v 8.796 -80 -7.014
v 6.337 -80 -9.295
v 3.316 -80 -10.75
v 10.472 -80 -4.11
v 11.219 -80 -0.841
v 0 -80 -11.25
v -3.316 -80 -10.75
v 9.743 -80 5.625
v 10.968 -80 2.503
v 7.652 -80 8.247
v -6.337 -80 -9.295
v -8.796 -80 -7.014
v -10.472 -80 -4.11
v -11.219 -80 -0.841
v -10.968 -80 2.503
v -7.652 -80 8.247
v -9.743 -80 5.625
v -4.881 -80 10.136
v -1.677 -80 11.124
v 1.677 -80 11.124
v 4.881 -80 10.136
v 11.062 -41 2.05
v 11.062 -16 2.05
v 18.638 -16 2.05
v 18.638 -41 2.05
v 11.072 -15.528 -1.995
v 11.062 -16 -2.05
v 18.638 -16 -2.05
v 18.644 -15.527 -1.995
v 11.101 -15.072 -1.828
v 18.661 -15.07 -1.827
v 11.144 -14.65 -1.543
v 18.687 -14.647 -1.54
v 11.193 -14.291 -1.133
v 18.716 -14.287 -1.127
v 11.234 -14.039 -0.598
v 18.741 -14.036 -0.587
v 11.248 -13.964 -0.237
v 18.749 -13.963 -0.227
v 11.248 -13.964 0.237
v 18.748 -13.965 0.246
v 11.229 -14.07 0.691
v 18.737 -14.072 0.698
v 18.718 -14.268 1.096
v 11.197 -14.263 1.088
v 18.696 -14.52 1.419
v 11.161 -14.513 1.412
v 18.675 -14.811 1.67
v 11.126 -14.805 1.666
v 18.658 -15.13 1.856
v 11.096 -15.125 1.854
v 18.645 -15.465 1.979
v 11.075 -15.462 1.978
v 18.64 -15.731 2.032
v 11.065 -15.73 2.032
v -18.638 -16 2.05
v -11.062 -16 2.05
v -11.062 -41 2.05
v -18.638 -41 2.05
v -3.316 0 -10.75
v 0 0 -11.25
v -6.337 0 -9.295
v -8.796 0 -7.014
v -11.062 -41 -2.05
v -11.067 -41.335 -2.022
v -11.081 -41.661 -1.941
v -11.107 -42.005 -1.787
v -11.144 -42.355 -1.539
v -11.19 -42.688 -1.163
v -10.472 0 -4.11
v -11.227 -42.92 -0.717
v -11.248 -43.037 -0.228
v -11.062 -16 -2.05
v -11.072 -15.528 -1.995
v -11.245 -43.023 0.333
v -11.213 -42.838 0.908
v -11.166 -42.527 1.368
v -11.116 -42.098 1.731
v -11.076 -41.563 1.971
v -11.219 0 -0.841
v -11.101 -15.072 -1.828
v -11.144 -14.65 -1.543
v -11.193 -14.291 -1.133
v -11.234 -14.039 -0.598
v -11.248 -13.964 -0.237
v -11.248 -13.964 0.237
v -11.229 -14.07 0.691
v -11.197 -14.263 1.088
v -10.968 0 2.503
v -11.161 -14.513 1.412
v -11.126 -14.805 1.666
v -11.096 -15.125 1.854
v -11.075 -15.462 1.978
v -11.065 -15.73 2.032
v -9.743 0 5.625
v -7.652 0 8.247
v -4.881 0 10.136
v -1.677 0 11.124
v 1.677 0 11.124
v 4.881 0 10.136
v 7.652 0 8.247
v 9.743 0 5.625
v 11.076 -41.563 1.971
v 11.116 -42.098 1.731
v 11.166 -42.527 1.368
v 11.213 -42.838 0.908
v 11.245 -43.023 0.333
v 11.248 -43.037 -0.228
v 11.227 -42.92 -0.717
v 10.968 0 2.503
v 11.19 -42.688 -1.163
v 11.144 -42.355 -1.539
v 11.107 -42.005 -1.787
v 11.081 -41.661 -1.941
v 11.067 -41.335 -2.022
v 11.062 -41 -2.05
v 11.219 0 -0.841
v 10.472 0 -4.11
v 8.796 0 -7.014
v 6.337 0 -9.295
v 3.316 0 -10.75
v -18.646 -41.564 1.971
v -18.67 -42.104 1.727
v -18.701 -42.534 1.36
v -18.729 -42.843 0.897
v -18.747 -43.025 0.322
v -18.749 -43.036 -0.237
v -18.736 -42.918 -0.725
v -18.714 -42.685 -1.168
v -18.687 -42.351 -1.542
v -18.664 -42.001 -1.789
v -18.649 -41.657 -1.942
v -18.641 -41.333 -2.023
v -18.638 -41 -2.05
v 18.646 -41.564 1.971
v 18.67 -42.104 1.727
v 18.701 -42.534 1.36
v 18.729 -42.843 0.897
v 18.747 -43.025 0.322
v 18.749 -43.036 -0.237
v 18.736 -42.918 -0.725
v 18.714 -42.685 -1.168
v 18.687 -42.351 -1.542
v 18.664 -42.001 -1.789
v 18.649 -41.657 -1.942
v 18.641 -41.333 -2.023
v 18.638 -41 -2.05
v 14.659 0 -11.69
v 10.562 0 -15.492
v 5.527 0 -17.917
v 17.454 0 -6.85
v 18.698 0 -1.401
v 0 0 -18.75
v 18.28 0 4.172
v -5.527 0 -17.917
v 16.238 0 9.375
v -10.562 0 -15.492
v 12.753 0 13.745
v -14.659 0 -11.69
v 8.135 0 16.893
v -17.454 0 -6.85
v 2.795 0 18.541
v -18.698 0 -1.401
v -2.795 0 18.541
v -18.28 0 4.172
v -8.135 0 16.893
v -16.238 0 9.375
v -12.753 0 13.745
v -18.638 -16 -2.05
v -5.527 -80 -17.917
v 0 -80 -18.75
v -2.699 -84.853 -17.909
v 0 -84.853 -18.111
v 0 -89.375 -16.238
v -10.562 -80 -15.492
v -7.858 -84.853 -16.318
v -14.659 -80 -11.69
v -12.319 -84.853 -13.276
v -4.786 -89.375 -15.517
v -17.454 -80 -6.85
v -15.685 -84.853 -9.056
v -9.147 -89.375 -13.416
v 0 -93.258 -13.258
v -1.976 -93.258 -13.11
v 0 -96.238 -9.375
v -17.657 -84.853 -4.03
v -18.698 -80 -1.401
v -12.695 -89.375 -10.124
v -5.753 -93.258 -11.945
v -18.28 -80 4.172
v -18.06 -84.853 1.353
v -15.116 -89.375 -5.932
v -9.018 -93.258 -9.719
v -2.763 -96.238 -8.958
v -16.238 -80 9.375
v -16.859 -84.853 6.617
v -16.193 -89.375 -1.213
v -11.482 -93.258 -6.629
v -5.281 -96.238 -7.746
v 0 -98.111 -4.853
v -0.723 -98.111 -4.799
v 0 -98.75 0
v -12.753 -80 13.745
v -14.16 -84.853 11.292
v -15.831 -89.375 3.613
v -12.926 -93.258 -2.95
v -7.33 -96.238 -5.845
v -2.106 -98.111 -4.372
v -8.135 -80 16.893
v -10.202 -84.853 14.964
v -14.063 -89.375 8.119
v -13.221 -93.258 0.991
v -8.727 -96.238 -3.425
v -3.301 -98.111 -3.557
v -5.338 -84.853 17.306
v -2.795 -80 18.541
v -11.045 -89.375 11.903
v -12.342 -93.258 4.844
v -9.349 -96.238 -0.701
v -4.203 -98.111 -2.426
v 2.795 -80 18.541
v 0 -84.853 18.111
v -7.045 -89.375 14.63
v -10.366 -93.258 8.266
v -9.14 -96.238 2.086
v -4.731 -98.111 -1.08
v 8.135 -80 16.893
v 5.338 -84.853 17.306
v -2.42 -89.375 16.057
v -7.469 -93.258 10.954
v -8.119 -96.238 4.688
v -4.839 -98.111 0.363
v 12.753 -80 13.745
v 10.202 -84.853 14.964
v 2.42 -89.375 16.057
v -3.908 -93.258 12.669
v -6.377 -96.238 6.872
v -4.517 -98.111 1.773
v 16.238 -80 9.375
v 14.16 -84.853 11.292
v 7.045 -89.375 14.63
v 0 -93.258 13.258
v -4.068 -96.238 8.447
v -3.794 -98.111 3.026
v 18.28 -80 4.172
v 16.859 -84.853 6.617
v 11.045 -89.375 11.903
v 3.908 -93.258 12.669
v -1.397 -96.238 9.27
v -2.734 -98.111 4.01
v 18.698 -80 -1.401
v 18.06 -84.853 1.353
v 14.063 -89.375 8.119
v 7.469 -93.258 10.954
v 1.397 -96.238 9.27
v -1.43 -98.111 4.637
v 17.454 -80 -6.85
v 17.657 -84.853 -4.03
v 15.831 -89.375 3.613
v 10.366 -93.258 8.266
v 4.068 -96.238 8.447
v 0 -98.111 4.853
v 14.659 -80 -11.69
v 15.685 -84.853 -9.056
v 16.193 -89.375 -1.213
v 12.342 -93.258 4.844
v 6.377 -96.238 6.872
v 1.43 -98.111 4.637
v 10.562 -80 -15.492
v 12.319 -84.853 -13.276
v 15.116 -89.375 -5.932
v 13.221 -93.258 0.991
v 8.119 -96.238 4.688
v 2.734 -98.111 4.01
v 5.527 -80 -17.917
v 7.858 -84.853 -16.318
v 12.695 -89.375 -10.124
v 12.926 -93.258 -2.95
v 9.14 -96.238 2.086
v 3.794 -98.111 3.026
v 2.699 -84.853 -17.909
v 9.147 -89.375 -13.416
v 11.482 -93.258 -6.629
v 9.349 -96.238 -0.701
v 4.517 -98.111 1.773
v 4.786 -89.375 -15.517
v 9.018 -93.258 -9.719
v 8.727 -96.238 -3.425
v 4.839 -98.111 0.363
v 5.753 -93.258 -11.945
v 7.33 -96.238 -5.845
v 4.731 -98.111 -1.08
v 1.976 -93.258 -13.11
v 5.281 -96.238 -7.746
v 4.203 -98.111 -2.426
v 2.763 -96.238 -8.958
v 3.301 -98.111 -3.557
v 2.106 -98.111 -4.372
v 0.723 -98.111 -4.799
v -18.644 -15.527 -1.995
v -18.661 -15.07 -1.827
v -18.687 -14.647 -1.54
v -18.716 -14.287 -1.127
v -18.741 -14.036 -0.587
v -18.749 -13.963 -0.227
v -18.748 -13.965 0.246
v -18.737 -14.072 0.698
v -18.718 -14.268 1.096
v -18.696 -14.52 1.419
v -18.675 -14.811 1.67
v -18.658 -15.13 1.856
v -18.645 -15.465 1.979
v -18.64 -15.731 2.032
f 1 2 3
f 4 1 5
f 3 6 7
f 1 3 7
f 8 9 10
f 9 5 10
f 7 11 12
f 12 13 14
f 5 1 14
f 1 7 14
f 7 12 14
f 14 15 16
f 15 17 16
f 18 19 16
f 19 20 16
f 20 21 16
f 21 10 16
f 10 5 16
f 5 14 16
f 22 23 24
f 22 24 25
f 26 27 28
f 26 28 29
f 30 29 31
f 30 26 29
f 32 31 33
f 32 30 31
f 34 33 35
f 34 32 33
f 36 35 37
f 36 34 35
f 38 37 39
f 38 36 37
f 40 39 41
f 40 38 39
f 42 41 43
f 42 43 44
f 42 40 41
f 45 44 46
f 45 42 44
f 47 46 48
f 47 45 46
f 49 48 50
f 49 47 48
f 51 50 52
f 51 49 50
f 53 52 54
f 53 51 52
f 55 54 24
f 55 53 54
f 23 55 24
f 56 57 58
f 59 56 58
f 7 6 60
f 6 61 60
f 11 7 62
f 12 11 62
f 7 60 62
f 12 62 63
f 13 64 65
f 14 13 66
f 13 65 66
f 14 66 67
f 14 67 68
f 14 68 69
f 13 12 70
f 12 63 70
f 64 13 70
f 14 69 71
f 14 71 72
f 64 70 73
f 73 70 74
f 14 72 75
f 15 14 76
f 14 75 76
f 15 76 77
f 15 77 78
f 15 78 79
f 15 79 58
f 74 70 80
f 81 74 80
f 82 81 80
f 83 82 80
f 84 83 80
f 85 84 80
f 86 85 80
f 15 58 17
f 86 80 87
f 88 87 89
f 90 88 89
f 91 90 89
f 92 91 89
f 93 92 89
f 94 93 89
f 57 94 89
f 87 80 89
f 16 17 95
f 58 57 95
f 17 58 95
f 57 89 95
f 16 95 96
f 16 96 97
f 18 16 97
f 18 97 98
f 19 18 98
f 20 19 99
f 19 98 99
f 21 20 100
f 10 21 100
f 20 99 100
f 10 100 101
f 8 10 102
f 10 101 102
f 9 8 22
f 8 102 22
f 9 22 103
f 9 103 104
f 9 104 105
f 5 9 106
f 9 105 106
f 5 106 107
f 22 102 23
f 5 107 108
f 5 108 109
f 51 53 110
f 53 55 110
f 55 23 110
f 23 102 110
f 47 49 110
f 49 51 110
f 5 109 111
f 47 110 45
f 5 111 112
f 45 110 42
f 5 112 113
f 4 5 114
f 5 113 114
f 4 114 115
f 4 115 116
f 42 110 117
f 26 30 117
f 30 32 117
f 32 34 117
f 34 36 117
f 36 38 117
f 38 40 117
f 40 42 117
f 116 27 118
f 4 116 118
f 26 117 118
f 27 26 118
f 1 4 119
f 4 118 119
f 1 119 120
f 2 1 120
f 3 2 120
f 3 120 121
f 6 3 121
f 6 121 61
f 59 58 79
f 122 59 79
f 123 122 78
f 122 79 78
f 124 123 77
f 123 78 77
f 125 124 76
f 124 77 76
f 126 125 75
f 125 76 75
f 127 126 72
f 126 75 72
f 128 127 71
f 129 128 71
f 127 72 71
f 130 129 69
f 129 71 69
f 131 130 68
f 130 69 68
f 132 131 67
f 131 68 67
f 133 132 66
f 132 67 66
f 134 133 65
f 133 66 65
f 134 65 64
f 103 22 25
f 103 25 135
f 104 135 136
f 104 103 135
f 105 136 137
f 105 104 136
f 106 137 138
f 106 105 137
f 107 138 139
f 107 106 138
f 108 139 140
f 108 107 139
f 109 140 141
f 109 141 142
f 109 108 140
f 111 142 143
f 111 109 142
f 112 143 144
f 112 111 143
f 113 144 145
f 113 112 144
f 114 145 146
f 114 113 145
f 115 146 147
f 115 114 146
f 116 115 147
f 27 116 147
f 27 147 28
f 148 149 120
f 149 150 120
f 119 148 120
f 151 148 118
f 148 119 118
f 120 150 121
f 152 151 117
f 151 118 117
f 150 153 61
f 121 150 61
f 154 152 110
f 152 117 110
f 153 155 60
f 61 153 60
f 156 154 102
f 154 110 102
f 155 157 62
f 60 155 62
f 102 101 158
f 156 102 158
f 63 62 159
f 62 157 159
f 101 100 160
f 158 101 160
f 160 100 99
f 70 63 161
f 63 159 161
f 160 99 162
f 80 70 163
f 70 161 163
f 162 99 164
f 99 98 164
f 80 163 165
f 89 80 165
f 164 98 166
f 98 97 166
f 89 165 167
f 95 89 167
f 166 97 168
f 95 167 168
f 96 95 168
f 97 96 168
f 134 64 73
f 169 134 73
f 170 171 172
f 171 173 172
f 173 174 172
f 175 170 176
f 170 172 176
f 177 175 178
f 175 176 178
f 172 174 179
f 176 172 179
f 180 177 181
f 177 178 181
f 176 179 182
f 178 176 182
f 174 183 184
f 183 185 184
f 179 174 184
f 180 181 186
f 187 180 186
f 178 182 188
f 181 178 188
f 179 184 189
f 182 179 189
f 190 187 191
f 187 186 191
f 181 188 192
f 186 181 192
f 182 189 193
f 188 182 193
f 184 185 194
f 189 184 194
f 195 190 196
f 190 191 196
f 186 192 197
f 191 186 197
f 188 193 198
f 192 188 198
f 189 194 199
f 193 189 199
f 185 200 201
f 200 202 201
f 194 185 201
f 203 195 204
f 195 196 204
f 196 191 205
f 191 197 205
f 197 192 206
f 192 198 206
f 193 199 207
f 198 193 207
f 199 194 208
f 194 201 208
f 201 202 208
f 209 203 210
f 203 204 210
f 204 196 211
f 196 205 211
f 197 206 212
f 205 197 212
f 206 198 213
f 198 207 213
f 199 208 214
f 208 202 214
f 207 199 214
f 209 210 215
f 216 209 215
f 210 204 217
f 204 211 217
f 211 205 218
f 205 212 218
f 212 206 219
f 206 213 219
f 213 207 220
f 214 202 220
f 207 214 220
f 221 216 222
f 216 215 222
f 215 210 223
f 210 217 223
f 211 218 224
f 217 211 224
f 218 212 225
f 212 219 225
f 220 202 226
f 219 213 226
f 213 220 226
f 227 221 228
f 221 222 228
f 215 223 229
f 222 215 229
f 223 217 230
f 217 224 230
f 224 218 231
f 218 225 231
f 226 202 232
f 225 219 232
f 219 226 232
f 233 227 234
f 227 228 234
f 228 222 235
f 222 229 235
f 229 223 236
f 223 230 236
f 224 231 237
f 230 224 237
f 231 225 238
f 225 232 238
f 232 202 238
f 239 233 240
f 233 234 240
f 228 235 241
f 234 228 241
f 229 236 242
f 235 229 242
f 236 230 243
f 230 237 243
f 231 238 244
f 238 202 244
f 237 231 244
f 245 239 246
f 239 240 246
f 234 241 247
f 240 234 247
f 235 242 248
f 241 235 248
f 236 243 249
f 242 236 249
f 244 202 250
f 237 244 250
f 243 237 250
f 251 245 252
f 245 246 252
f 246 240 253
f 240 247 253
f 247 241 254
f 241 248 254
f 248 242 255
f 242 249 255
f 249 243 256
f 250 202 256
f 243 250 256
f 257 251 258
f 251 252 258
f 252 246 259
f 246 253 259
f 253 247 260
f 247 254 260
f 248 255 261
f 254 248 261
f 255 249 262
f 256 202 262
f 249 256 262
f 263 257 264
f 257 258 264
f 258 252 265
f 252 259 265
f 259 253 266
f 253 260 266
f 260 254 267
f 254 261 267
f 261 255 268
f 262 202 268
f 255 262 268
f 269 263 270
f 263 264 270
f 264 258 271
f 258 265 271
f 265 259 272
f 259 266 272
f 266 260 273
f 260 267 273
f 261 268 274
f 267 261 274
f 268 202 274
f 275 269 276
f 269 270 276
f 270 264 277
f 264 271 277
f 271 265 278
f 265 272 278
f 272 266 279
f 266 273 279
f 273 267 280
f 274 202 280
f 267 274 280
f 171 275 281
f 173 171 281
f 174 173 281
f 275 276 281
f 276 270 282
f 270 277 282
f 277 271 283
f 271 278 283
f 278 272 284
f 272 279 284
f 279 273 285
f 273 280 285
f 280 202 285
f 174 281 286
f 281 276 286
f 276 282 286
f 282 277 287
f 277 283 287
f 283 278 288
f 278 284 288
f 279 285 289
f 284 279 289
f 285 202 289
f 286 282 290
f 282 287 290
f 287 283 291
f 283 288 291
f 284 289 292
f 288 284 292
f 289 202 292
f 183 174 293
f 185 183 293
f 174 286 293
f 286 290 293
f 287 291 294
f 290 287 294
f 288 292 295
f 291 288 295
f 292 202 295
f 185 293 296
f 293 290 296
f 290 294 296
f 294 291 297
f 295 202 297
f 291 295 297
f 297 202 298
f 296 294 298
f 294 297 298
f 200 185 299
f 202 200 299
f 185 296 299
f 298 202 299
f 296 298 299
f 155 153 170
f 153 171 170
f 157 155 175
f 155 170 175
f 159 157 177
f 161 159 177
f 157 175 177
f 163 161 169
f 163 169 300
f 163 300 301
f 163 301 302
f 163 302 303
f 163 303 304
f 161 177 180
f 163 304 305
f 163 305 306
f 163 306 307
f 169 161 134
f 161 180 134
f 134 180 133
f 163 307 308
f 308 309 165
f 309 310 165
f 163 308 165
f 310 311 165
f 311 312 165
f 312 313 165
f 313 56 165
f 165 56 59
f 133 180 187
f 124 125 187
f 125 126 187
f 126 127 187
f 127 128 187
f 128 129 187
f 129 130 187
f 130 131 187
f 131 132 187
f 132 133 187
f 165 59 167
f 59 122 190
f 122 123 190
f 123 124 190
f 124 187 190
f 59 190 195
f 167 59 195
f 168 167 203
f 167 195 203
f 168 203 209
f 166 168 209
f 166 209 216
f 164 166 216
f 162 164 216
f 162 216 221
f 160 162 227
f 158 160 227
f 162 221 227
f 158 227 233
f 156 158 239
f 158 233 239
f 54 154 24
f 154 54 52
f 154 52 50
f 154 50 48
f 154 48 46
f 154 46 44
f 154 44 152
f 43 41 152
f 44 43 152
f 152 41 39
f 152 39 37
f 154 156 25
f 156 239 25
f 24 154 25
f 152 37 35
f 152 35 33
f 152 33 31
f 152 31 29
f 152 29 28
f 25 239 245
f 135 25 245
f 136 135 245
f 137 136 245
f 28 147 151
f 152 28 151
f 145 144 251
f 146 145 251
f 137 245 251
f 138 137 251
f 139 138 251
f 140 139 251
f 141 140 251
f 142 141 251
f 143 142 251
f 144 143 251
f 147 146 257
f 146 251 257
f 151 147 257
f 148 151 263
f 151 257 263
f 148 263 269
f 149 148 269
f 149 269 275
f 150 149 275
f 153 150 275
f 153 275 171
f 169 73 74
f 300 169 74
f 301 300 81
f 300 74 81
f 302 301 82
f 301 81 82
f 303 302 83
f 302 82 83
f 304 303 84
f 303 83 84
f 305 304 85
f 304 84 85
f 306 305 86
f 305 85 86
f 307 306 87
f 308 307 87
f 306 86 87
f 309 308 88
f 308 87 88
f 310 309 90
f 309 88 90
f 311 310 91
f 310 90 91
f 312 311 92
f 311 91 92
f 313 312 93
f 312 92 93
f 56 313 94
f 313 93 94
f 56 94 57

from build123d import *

# Parameters (mm, degrees)
CUT_EXTRUDE1_DEPTH      = 19.75
CUT_EXTRUDE1_DEPTH_BACK = 19.75


with BuildPart() as part:
    # Sketch1 → Revolve1 (revolve)
    with BuildSketch(Plane(origin=(0, 0, 0), x_dir=(0, 0, -1), z_dir=(1, 0, 0))):
        with BuildLine():
            ThreePointArc((18.75, -80), (13.258252147, -93.258252147), (0, -98.75))
            Line((0, -98.75), (0, -80))
            Line((0, -80), (11.25, -80))
            Line((11.25, -80), (11.25, 0))
            Line((11.25, 0), (18.75, 0))
            Line((18.75, 0), (18.75, -80))
        make_face()
    revolve(axis=Axis((0, -1981.522753143, 0), (0, 1, 0)))

    # Sketch1<3> → Cut-Extrude1 (cut, two sides)
    with BuildSketch(Plane(origin=(0, 0, 0), x_dir=(0, 0, -1), z_dir=(1, 0, 0))) as cut_extrude1_sk:
        with BuildLine():
            Line((-2.05, -16), (-2.05, -41))
            ThreePointArc((-2.05, -41), (0, -43.05), (2.05, -41))
            Line((2.05, -41), (2.05, -16))
            ThreePointArc((2.05, -16), (0, -13.95), (-2.05, -16))
        make_face()
    extrude(amount=CUT_EXTRUDE1_DEPTH, mode=Mode.SUBTRACT)
    extrude(cut_extrude1_sk.sketch, amount=-CUT_EXTRUDE1_DEPTH_BACK, mode=Mode.SUBTRACT)


solid = part.part
